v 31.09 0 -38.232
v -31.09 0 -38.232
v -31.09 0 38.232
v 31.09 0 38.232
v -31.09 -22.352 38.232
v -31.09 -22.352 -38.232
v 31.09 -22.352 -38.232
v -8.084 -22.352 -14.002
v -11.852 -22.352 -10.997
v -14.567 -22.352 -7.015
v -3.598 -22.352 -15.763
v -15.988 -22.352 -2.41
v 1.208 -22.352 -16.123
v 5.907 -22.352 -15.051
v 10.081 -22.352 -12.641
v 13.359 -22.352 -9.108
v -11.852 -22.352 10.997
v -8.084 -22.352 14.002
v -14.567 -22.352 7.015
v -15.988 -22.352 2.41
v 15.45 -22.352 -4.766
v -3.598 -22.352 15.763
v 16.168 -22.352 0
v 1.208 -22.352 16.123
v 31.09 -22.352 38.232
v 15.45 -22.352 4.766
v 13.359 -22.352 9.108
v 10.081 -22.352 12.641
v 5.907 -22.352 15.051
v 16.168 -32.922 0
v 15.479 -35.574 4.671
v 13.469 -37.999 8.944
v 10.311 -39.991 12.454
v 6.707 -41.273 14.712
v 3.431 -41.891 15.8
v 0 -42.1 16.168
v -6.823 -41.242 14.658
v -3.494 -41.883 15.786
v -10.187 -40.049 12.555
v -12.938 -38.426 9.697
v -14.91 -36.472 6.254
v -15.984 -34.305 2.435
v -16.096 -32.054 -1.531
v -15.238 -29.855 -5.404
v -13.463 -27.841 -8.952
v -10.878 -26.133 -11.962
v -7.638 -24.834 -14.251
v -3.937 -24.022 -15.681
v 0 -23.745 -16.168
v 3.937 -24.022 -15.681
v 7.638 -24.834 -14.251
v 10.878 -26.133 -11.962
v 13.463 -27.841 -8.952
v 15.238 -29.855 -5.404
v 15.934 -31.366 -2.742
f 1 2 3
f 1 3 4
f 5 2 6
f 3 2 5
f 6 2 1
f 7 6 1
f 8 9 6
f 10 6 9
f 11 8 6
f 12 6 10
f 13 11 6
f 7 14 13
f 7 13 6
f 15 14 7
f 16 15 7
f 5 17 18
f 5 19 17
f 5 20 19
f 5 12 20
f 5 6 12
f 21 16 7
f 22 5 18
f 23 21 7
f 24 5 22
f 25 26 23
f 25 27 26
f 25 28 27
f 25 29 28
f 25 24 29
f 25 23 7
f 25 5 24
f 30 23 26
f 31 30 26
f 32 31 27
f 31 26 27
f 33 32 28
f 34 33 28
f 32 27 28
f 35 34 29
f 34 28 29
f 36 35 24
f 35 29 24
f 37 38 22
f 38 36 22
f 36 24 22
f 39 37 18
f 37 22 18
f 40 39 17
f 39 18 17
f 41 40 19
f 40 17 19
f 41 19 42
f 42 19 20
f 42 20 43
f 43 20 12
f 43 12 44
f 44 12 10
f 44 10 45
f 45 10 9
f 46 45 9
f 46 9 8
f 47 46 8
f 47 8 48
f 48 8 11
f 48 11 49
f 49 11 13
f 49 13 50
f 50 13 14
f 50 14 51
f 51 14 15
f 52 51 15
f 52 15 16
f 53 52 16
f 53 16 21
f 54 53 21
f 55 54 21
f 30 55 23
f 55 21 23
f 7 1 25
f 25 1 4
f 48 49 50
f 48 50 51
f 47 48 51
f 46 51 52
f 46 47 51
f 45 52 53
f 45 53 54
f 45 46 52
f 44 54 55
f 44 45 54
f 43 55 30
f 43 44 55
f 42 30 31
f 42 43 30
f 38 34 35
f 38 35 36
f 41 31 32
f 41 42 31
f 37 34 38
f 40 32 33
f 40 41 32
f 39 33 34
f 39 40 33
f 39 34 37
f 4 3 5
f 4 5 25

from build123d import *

# Parameters (mm, degrees)
F0_R     = 16.168204
F0_W     = 62.179334
F0_H     = 76.463766
F1_DEPTH = 22.352
F2_DEPTH = 43.18
F4_DEPTH = 25.4
F5_DEPTH = 25.4


with BuildPart() as f1:
    # F0 (on Front) → F1 (new body)
    with BuildSketch(Plane.XZ):
        Circle(F0_R)
        Rectangle(F0_W, F0_H)
        Circle(F0_R, mode=Mode.SUBTRACT)
    extrude(amount=F1_DEPTH)

    # F0 (on Front) → F2 (join)
    with BuildSketch(Plane.XZ):
        Circle(F0_R)
    extrude(amount=F2_DEPTH)

    # F3 (on Right) → F4 (cut)
    with BuildSketch(Plane.YZ):
        Polygon((-43.015767, 17.78225), (-58.439311, 18.220695), (-58.439311, -16.693853), (-23.446971, -16.693853), align=None)
    extrude(amount=F4_DEPTH, mode=Mode.SUBTRACT)

    # F3 (on Right) → F5 (cut)
    with BuildSketch(Plane.YZ):
        Polygon((-43.015767, 17.78225), (-58.439311, 18.220695), (-58.439311, -16.693853), (-23.446971, -16.693853), align=None)
    extrude(amount=-F5_DEPTH, mode=Mode.SUBTRACT)


solid = f1.part
